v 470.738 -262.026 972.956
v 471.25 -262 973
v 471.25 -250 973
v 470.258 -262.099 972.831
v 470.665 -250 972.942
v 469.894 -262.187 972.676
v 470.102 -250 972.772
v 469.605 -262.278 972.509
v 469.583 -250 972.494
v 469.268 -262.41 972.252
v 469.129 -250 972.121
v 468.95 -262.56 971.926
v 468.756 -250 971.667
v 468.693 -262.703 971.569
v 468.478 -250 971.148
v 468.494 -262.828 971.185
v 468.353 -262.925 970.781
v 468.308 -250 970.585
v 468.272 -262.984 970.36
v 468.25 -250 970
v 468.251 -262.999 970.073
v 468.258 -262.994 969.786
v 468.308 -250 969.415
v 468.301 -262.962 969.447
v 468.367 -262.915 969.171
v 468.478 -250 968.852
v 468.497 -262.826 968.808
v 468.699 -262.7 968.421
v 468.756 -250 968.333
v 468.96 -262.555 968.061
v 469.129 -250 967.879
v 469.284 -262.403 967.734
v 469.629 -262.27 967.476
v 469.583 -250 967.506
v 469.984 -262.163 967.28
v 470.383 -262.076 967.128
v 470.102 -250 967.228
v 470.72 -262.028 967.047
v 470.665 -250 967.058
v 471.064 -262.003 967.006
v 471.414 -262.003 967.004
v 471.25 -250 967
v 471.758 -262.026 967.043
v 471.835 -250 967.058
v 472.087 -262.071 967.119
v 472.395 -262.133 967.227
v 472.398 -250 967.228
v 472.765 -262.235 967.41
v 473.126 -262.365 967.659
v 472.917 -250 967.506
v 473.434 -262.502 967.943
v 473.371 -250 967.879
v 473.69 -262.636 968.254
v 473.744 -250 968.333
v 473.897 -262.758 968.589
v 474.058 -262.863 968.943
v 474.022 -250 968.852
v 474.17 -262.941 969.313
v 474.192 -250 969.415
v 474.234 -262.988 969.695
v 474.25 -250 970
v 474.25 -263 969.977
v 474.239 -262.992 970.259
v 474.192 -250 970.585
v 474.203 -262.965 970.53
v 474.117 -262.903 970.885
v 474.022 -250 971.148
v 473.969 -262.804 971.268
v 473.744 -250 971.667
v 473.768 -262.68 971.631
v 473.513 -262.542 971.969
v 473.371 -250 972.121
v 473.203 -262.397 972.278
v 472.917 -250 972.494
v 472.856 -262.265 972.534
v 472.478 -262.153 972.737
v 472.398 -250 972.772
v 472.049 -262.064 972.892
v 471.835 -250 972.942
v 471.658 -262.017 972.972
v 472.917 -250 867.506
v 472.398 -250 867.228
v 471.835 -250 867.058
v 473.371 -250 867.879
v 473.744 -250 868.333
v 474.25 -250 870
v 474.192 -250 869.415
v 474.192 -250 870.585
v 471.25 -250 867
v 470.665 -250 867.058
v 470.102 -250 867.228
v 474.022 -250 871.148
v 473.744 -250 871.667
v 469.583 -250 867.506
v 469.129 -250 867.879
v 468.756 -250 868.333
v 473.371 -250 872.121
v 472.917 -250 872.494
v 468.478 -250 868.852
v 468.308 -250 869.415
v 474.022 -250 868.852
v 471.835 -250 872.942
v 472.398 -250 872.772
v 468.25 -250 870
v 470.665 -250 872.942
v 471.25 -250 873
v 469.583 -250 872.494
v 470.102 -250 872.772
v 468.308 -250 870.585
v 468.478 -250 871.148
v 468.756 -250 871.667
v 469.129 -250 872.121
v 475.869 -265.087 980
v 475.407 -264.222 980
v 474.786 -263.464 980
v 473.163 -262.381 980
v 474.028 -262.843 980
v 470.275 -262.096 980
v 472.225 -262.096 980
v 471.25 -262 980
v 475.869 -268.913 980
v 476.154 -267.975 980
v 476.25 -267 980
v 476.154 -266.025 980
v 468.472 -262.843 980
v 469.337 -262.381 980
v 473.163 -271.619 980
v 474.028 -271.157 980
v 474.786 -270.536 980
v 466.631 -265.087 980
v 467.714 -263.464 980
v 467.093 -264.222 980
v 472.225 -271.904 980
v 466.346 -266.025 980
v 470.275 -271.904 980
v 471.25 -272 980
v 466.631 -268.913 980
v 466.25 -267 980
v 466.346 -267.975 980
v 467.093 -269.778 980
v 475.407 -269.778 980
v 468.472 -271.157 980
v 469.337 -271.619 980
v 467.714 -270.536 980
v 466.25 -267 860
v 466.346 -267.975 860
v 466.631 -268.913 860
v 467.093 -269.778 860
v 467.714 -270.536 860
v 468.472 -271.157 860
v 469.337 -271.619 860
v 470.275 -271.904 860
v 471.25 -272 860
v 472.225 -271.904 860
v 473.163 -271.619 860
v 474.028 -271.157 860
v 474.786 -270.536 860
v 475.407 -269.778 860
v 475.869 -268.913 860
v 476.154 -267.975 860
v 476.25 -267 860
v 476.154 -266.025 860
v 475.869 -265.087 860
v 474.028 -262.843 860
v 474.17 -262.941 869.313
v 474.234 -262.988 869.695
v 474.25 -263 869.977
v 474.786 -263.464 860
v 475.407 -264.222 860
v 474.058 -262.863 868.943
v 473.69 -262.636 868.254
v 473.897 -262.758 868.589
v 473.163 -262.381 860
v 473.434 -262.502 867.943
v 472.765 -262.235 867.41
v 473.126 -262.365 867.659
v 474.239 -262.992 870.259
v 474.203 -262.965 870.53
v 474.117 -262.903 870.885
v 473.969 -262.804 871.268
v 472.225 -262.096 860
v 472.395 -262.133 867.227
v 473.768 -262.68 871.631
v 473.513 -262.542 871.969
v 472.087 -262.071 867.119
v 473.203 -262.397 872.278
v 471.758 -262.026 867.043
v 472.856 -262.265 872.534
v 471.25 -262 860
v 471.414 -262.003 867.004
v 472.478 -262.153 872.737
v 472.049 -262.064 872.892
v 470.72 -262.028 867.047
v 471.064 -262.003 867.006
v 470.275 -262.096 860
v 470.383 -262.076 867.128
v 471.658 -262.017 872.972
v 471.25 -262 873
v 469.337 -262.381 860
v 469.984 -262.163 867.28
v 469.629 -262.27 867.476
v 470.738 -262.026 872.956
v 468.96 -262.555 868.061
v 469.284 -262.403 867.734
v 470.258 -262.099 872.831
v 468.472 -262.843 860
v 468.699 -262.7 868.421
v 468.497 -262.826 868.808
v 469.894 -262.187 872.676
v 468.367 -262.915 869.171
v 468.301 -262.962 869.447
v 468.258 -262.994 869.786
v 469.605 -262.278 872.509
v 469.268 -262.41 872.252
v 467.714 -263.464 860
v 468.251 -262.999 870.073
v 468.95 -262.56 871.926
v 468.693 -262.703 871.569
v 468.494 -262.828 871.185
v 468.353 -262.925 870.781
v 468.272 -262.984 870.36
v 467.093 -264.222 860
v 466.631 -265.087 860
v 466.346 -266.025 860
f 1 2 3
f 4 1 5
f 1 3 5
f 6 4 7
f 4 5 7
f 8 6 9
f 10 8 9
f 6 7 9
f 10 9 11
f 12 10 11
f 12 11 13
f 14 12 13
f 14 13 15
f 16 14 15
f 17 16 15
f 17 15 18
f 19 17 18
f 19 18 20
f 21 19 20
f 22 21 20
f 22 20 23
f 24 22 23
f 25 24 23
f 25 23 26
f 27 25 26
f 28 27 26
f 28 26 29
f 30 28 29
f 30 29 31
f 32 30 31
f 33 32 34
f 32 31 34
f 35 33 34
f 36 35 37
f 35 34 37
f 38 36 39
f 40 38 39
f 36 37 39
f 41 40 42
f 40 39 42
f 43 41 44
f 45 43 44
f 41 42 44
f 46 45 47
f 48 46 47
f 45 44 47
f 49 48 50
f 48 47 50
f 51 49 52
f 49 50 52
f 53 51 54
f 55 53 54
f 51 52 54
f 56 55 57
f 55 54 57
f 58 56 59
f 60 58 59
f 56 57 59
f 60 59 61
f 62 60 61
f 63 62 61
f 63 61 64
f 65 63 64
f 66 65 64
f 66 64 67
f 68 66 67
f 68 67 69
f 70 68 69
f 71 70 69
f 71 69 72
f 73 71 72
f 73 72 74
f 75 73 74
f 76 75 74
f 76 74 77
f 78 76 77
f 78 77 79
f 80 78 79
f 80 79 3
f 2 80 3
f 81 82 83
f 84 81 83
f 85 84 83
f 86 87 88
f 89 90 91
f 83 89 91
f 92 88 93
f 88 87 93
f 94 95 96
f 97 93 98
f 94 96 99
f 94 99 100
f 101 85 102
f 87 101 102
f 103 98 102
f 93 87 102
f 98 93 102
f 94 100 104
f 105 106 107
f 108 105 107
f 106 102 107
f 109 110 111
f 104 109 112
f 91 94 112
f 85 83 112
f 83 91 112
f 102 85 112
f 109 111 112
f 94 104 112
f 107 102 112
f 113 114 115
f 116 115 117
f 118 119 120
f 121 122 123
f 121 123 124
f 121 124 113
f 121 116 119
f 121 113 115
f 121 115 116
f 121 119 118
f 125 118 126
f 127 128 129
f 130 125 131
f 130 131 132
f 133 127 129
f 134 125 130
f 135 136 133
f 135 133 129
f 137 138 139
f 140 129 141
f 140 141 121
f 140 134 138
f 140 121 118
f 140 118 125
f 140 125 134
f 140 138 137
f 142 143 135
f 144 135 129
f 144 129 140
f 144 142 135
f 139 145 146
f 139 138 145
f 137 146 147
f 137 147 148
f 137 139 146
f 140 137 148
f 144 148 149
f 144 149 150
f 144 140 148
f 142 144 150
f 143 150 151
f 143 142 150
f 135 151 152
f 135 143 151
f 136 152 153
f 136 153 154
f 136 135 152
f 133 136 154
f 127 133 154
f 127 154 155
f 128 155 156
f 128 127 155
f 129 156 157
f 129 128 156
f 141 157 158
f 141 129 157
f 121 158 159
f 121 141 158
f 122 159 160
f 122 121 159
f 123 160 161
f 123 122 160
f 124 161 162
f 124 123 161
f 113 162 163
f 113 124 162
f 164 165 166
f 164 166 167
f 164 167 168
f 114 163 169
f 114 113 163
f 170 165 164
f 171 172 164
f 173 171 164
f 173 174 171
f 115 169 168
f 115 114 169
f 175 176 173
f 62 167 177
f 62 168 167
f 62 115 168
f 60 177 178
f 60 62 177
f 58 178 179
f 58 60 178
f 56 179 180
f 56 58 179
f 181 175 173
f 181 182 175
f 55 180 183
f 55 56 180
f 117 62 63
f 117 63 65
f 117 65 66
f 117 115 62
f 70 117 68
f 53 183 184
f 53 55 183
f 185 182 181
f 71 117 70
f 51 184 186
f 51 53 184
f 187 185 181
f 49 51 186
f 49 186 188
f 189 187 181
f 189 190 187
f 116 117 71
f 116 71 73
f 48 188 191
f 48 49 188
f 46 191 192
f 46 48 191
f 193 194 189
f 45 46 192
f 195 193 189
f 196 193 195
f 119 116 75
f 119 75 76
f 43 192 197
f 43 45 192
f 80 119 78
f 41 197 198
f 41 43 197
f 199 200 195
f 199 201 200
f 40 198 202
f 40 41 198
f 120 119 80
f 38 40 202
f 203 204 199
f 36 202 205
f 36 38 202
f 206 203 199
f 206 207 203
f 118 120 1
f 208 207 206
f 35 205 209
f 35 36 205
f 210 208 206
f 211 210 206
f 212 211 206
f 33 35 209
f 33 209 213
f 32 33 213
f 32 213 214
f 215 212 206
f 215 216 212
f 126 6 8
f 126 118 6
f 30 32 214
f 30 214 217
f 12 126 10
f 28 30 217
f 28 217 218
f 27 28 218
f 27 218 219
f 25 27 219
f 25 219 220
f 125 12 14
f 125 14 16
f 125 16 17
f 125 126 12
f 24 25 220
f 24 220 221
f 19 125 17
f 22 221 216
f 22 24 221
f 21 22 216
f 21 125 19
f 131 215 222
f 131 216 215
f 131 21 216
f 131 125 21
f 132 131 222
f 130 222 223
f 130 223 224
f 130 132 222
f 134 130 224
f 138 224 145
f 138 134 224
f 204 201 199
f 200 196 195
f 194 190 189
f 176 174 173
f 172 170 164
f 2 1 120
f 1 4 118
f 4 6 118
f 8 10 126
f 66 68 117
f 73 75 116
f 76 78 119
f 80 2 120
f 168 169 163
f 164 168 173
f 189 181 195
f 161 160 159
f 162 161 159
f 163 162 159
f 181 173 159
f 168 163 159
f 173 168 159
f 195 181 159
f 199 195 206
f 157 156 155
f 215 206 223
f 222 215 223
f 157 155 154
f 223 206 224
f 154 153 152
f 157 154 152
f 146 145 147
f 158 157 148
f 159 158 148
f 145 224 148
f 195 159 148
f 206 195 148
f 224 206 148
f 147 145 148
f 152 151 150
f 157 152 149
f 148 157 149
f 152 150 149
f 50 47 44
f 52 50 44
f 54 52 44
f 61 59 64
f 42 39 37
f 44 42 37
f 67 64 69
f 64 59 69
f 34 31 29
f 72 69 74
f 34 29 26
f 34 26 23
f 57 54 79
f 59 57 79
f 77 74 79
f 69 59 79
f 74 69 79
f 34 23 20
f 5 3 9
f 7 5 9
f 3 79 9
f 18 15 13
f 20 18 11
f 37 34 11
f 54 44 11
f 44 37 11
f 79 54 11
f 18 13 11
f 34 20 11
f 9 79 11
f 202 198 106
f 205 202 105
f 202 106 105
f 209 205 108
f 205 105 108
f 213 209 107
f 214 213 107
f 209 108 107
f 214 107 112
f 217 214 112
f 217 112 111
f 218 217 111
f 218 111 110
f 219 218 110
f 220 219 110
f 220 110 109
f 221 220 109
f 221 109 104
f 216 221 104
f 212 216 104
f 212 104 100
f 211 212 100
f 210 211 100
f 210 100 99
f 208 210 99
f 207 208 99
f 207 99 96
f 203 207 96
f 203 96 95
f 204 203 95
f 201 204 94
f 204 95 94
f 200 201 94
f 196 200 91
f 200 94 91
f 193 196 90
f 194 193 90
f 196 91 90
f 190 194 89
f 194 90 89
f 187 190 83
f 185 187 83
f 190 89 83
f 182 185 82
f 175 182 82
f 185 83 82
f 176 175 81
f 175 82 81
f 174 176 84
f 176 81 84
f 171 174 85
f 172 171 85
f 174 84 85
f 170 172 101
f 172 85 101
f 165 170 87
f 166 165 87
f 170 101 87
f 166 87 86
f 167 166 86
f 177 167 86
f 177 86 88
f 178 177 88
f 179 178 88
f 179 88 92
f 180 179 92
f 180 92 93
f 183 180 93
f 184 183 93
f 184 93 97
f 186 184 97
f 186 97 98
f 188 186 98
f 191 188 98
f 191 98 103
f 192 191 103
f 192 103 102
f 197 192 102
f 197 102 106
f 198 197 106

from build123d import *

# Parameters (mm, degrees)
SKETCH1248_R           = 5
EXTRUDE084143362_DEPTH = 60
CLONE2D015_R           = 3
EXTRUDE084143363_DEPTH = 17
SKETCH1249_R           = 3
EXTRUDE084143361_DEPTH = 17


with BuildPart() as extrude084143362:
    # Sketch1248 (on Sketch) → Extrude084143362 (new body, symmetric)
    with BuildSketch(Plane(origin=(471.25, -267, 0), x_dir=(-1, 0, 0), z_dir=(0, 0, 1))):
        Circle(SKETCH1248_R)
    extrude(amount=EXTRUDE084143362_DEPTH, both=True)


with BuildPart() as extrude084143363:
    # Clone2D015 (on Sketch) → Extrude084143363 (new body)
    with BuildSketch(Plane(origin=(471.25, -250, 50), x_dir=(0, 0, 1), z_dir=(0, -1, 0))):
        Circle(CLONE2D015_R)
    extrude(amount=EXTRUDE084143363_DEPTH)


with BuildPart() as clone002:
    # Sketch1249 (on Sketch) → Extrude084143361 (new body)
    with BuildSketch(Plane(origin=(471.25, -250, -50), x_dir=(0, 0, 1), z_dir=(0, -1, 0))):
        Circle(SKETCH1249_R)
    extrude(amount=EXTRUDE084143361_DEPTH)

    # Fusion008: union Extrude084143362, Extrude084143363
    add(extrude084143362.part)
    add(extrude084143363.part)


with BuildPart() as clone002_1:
    # Clone002 placement: moved
    add(clone002.part.moved(Location((0, 0, 920))))


solid = clone002_1.part
